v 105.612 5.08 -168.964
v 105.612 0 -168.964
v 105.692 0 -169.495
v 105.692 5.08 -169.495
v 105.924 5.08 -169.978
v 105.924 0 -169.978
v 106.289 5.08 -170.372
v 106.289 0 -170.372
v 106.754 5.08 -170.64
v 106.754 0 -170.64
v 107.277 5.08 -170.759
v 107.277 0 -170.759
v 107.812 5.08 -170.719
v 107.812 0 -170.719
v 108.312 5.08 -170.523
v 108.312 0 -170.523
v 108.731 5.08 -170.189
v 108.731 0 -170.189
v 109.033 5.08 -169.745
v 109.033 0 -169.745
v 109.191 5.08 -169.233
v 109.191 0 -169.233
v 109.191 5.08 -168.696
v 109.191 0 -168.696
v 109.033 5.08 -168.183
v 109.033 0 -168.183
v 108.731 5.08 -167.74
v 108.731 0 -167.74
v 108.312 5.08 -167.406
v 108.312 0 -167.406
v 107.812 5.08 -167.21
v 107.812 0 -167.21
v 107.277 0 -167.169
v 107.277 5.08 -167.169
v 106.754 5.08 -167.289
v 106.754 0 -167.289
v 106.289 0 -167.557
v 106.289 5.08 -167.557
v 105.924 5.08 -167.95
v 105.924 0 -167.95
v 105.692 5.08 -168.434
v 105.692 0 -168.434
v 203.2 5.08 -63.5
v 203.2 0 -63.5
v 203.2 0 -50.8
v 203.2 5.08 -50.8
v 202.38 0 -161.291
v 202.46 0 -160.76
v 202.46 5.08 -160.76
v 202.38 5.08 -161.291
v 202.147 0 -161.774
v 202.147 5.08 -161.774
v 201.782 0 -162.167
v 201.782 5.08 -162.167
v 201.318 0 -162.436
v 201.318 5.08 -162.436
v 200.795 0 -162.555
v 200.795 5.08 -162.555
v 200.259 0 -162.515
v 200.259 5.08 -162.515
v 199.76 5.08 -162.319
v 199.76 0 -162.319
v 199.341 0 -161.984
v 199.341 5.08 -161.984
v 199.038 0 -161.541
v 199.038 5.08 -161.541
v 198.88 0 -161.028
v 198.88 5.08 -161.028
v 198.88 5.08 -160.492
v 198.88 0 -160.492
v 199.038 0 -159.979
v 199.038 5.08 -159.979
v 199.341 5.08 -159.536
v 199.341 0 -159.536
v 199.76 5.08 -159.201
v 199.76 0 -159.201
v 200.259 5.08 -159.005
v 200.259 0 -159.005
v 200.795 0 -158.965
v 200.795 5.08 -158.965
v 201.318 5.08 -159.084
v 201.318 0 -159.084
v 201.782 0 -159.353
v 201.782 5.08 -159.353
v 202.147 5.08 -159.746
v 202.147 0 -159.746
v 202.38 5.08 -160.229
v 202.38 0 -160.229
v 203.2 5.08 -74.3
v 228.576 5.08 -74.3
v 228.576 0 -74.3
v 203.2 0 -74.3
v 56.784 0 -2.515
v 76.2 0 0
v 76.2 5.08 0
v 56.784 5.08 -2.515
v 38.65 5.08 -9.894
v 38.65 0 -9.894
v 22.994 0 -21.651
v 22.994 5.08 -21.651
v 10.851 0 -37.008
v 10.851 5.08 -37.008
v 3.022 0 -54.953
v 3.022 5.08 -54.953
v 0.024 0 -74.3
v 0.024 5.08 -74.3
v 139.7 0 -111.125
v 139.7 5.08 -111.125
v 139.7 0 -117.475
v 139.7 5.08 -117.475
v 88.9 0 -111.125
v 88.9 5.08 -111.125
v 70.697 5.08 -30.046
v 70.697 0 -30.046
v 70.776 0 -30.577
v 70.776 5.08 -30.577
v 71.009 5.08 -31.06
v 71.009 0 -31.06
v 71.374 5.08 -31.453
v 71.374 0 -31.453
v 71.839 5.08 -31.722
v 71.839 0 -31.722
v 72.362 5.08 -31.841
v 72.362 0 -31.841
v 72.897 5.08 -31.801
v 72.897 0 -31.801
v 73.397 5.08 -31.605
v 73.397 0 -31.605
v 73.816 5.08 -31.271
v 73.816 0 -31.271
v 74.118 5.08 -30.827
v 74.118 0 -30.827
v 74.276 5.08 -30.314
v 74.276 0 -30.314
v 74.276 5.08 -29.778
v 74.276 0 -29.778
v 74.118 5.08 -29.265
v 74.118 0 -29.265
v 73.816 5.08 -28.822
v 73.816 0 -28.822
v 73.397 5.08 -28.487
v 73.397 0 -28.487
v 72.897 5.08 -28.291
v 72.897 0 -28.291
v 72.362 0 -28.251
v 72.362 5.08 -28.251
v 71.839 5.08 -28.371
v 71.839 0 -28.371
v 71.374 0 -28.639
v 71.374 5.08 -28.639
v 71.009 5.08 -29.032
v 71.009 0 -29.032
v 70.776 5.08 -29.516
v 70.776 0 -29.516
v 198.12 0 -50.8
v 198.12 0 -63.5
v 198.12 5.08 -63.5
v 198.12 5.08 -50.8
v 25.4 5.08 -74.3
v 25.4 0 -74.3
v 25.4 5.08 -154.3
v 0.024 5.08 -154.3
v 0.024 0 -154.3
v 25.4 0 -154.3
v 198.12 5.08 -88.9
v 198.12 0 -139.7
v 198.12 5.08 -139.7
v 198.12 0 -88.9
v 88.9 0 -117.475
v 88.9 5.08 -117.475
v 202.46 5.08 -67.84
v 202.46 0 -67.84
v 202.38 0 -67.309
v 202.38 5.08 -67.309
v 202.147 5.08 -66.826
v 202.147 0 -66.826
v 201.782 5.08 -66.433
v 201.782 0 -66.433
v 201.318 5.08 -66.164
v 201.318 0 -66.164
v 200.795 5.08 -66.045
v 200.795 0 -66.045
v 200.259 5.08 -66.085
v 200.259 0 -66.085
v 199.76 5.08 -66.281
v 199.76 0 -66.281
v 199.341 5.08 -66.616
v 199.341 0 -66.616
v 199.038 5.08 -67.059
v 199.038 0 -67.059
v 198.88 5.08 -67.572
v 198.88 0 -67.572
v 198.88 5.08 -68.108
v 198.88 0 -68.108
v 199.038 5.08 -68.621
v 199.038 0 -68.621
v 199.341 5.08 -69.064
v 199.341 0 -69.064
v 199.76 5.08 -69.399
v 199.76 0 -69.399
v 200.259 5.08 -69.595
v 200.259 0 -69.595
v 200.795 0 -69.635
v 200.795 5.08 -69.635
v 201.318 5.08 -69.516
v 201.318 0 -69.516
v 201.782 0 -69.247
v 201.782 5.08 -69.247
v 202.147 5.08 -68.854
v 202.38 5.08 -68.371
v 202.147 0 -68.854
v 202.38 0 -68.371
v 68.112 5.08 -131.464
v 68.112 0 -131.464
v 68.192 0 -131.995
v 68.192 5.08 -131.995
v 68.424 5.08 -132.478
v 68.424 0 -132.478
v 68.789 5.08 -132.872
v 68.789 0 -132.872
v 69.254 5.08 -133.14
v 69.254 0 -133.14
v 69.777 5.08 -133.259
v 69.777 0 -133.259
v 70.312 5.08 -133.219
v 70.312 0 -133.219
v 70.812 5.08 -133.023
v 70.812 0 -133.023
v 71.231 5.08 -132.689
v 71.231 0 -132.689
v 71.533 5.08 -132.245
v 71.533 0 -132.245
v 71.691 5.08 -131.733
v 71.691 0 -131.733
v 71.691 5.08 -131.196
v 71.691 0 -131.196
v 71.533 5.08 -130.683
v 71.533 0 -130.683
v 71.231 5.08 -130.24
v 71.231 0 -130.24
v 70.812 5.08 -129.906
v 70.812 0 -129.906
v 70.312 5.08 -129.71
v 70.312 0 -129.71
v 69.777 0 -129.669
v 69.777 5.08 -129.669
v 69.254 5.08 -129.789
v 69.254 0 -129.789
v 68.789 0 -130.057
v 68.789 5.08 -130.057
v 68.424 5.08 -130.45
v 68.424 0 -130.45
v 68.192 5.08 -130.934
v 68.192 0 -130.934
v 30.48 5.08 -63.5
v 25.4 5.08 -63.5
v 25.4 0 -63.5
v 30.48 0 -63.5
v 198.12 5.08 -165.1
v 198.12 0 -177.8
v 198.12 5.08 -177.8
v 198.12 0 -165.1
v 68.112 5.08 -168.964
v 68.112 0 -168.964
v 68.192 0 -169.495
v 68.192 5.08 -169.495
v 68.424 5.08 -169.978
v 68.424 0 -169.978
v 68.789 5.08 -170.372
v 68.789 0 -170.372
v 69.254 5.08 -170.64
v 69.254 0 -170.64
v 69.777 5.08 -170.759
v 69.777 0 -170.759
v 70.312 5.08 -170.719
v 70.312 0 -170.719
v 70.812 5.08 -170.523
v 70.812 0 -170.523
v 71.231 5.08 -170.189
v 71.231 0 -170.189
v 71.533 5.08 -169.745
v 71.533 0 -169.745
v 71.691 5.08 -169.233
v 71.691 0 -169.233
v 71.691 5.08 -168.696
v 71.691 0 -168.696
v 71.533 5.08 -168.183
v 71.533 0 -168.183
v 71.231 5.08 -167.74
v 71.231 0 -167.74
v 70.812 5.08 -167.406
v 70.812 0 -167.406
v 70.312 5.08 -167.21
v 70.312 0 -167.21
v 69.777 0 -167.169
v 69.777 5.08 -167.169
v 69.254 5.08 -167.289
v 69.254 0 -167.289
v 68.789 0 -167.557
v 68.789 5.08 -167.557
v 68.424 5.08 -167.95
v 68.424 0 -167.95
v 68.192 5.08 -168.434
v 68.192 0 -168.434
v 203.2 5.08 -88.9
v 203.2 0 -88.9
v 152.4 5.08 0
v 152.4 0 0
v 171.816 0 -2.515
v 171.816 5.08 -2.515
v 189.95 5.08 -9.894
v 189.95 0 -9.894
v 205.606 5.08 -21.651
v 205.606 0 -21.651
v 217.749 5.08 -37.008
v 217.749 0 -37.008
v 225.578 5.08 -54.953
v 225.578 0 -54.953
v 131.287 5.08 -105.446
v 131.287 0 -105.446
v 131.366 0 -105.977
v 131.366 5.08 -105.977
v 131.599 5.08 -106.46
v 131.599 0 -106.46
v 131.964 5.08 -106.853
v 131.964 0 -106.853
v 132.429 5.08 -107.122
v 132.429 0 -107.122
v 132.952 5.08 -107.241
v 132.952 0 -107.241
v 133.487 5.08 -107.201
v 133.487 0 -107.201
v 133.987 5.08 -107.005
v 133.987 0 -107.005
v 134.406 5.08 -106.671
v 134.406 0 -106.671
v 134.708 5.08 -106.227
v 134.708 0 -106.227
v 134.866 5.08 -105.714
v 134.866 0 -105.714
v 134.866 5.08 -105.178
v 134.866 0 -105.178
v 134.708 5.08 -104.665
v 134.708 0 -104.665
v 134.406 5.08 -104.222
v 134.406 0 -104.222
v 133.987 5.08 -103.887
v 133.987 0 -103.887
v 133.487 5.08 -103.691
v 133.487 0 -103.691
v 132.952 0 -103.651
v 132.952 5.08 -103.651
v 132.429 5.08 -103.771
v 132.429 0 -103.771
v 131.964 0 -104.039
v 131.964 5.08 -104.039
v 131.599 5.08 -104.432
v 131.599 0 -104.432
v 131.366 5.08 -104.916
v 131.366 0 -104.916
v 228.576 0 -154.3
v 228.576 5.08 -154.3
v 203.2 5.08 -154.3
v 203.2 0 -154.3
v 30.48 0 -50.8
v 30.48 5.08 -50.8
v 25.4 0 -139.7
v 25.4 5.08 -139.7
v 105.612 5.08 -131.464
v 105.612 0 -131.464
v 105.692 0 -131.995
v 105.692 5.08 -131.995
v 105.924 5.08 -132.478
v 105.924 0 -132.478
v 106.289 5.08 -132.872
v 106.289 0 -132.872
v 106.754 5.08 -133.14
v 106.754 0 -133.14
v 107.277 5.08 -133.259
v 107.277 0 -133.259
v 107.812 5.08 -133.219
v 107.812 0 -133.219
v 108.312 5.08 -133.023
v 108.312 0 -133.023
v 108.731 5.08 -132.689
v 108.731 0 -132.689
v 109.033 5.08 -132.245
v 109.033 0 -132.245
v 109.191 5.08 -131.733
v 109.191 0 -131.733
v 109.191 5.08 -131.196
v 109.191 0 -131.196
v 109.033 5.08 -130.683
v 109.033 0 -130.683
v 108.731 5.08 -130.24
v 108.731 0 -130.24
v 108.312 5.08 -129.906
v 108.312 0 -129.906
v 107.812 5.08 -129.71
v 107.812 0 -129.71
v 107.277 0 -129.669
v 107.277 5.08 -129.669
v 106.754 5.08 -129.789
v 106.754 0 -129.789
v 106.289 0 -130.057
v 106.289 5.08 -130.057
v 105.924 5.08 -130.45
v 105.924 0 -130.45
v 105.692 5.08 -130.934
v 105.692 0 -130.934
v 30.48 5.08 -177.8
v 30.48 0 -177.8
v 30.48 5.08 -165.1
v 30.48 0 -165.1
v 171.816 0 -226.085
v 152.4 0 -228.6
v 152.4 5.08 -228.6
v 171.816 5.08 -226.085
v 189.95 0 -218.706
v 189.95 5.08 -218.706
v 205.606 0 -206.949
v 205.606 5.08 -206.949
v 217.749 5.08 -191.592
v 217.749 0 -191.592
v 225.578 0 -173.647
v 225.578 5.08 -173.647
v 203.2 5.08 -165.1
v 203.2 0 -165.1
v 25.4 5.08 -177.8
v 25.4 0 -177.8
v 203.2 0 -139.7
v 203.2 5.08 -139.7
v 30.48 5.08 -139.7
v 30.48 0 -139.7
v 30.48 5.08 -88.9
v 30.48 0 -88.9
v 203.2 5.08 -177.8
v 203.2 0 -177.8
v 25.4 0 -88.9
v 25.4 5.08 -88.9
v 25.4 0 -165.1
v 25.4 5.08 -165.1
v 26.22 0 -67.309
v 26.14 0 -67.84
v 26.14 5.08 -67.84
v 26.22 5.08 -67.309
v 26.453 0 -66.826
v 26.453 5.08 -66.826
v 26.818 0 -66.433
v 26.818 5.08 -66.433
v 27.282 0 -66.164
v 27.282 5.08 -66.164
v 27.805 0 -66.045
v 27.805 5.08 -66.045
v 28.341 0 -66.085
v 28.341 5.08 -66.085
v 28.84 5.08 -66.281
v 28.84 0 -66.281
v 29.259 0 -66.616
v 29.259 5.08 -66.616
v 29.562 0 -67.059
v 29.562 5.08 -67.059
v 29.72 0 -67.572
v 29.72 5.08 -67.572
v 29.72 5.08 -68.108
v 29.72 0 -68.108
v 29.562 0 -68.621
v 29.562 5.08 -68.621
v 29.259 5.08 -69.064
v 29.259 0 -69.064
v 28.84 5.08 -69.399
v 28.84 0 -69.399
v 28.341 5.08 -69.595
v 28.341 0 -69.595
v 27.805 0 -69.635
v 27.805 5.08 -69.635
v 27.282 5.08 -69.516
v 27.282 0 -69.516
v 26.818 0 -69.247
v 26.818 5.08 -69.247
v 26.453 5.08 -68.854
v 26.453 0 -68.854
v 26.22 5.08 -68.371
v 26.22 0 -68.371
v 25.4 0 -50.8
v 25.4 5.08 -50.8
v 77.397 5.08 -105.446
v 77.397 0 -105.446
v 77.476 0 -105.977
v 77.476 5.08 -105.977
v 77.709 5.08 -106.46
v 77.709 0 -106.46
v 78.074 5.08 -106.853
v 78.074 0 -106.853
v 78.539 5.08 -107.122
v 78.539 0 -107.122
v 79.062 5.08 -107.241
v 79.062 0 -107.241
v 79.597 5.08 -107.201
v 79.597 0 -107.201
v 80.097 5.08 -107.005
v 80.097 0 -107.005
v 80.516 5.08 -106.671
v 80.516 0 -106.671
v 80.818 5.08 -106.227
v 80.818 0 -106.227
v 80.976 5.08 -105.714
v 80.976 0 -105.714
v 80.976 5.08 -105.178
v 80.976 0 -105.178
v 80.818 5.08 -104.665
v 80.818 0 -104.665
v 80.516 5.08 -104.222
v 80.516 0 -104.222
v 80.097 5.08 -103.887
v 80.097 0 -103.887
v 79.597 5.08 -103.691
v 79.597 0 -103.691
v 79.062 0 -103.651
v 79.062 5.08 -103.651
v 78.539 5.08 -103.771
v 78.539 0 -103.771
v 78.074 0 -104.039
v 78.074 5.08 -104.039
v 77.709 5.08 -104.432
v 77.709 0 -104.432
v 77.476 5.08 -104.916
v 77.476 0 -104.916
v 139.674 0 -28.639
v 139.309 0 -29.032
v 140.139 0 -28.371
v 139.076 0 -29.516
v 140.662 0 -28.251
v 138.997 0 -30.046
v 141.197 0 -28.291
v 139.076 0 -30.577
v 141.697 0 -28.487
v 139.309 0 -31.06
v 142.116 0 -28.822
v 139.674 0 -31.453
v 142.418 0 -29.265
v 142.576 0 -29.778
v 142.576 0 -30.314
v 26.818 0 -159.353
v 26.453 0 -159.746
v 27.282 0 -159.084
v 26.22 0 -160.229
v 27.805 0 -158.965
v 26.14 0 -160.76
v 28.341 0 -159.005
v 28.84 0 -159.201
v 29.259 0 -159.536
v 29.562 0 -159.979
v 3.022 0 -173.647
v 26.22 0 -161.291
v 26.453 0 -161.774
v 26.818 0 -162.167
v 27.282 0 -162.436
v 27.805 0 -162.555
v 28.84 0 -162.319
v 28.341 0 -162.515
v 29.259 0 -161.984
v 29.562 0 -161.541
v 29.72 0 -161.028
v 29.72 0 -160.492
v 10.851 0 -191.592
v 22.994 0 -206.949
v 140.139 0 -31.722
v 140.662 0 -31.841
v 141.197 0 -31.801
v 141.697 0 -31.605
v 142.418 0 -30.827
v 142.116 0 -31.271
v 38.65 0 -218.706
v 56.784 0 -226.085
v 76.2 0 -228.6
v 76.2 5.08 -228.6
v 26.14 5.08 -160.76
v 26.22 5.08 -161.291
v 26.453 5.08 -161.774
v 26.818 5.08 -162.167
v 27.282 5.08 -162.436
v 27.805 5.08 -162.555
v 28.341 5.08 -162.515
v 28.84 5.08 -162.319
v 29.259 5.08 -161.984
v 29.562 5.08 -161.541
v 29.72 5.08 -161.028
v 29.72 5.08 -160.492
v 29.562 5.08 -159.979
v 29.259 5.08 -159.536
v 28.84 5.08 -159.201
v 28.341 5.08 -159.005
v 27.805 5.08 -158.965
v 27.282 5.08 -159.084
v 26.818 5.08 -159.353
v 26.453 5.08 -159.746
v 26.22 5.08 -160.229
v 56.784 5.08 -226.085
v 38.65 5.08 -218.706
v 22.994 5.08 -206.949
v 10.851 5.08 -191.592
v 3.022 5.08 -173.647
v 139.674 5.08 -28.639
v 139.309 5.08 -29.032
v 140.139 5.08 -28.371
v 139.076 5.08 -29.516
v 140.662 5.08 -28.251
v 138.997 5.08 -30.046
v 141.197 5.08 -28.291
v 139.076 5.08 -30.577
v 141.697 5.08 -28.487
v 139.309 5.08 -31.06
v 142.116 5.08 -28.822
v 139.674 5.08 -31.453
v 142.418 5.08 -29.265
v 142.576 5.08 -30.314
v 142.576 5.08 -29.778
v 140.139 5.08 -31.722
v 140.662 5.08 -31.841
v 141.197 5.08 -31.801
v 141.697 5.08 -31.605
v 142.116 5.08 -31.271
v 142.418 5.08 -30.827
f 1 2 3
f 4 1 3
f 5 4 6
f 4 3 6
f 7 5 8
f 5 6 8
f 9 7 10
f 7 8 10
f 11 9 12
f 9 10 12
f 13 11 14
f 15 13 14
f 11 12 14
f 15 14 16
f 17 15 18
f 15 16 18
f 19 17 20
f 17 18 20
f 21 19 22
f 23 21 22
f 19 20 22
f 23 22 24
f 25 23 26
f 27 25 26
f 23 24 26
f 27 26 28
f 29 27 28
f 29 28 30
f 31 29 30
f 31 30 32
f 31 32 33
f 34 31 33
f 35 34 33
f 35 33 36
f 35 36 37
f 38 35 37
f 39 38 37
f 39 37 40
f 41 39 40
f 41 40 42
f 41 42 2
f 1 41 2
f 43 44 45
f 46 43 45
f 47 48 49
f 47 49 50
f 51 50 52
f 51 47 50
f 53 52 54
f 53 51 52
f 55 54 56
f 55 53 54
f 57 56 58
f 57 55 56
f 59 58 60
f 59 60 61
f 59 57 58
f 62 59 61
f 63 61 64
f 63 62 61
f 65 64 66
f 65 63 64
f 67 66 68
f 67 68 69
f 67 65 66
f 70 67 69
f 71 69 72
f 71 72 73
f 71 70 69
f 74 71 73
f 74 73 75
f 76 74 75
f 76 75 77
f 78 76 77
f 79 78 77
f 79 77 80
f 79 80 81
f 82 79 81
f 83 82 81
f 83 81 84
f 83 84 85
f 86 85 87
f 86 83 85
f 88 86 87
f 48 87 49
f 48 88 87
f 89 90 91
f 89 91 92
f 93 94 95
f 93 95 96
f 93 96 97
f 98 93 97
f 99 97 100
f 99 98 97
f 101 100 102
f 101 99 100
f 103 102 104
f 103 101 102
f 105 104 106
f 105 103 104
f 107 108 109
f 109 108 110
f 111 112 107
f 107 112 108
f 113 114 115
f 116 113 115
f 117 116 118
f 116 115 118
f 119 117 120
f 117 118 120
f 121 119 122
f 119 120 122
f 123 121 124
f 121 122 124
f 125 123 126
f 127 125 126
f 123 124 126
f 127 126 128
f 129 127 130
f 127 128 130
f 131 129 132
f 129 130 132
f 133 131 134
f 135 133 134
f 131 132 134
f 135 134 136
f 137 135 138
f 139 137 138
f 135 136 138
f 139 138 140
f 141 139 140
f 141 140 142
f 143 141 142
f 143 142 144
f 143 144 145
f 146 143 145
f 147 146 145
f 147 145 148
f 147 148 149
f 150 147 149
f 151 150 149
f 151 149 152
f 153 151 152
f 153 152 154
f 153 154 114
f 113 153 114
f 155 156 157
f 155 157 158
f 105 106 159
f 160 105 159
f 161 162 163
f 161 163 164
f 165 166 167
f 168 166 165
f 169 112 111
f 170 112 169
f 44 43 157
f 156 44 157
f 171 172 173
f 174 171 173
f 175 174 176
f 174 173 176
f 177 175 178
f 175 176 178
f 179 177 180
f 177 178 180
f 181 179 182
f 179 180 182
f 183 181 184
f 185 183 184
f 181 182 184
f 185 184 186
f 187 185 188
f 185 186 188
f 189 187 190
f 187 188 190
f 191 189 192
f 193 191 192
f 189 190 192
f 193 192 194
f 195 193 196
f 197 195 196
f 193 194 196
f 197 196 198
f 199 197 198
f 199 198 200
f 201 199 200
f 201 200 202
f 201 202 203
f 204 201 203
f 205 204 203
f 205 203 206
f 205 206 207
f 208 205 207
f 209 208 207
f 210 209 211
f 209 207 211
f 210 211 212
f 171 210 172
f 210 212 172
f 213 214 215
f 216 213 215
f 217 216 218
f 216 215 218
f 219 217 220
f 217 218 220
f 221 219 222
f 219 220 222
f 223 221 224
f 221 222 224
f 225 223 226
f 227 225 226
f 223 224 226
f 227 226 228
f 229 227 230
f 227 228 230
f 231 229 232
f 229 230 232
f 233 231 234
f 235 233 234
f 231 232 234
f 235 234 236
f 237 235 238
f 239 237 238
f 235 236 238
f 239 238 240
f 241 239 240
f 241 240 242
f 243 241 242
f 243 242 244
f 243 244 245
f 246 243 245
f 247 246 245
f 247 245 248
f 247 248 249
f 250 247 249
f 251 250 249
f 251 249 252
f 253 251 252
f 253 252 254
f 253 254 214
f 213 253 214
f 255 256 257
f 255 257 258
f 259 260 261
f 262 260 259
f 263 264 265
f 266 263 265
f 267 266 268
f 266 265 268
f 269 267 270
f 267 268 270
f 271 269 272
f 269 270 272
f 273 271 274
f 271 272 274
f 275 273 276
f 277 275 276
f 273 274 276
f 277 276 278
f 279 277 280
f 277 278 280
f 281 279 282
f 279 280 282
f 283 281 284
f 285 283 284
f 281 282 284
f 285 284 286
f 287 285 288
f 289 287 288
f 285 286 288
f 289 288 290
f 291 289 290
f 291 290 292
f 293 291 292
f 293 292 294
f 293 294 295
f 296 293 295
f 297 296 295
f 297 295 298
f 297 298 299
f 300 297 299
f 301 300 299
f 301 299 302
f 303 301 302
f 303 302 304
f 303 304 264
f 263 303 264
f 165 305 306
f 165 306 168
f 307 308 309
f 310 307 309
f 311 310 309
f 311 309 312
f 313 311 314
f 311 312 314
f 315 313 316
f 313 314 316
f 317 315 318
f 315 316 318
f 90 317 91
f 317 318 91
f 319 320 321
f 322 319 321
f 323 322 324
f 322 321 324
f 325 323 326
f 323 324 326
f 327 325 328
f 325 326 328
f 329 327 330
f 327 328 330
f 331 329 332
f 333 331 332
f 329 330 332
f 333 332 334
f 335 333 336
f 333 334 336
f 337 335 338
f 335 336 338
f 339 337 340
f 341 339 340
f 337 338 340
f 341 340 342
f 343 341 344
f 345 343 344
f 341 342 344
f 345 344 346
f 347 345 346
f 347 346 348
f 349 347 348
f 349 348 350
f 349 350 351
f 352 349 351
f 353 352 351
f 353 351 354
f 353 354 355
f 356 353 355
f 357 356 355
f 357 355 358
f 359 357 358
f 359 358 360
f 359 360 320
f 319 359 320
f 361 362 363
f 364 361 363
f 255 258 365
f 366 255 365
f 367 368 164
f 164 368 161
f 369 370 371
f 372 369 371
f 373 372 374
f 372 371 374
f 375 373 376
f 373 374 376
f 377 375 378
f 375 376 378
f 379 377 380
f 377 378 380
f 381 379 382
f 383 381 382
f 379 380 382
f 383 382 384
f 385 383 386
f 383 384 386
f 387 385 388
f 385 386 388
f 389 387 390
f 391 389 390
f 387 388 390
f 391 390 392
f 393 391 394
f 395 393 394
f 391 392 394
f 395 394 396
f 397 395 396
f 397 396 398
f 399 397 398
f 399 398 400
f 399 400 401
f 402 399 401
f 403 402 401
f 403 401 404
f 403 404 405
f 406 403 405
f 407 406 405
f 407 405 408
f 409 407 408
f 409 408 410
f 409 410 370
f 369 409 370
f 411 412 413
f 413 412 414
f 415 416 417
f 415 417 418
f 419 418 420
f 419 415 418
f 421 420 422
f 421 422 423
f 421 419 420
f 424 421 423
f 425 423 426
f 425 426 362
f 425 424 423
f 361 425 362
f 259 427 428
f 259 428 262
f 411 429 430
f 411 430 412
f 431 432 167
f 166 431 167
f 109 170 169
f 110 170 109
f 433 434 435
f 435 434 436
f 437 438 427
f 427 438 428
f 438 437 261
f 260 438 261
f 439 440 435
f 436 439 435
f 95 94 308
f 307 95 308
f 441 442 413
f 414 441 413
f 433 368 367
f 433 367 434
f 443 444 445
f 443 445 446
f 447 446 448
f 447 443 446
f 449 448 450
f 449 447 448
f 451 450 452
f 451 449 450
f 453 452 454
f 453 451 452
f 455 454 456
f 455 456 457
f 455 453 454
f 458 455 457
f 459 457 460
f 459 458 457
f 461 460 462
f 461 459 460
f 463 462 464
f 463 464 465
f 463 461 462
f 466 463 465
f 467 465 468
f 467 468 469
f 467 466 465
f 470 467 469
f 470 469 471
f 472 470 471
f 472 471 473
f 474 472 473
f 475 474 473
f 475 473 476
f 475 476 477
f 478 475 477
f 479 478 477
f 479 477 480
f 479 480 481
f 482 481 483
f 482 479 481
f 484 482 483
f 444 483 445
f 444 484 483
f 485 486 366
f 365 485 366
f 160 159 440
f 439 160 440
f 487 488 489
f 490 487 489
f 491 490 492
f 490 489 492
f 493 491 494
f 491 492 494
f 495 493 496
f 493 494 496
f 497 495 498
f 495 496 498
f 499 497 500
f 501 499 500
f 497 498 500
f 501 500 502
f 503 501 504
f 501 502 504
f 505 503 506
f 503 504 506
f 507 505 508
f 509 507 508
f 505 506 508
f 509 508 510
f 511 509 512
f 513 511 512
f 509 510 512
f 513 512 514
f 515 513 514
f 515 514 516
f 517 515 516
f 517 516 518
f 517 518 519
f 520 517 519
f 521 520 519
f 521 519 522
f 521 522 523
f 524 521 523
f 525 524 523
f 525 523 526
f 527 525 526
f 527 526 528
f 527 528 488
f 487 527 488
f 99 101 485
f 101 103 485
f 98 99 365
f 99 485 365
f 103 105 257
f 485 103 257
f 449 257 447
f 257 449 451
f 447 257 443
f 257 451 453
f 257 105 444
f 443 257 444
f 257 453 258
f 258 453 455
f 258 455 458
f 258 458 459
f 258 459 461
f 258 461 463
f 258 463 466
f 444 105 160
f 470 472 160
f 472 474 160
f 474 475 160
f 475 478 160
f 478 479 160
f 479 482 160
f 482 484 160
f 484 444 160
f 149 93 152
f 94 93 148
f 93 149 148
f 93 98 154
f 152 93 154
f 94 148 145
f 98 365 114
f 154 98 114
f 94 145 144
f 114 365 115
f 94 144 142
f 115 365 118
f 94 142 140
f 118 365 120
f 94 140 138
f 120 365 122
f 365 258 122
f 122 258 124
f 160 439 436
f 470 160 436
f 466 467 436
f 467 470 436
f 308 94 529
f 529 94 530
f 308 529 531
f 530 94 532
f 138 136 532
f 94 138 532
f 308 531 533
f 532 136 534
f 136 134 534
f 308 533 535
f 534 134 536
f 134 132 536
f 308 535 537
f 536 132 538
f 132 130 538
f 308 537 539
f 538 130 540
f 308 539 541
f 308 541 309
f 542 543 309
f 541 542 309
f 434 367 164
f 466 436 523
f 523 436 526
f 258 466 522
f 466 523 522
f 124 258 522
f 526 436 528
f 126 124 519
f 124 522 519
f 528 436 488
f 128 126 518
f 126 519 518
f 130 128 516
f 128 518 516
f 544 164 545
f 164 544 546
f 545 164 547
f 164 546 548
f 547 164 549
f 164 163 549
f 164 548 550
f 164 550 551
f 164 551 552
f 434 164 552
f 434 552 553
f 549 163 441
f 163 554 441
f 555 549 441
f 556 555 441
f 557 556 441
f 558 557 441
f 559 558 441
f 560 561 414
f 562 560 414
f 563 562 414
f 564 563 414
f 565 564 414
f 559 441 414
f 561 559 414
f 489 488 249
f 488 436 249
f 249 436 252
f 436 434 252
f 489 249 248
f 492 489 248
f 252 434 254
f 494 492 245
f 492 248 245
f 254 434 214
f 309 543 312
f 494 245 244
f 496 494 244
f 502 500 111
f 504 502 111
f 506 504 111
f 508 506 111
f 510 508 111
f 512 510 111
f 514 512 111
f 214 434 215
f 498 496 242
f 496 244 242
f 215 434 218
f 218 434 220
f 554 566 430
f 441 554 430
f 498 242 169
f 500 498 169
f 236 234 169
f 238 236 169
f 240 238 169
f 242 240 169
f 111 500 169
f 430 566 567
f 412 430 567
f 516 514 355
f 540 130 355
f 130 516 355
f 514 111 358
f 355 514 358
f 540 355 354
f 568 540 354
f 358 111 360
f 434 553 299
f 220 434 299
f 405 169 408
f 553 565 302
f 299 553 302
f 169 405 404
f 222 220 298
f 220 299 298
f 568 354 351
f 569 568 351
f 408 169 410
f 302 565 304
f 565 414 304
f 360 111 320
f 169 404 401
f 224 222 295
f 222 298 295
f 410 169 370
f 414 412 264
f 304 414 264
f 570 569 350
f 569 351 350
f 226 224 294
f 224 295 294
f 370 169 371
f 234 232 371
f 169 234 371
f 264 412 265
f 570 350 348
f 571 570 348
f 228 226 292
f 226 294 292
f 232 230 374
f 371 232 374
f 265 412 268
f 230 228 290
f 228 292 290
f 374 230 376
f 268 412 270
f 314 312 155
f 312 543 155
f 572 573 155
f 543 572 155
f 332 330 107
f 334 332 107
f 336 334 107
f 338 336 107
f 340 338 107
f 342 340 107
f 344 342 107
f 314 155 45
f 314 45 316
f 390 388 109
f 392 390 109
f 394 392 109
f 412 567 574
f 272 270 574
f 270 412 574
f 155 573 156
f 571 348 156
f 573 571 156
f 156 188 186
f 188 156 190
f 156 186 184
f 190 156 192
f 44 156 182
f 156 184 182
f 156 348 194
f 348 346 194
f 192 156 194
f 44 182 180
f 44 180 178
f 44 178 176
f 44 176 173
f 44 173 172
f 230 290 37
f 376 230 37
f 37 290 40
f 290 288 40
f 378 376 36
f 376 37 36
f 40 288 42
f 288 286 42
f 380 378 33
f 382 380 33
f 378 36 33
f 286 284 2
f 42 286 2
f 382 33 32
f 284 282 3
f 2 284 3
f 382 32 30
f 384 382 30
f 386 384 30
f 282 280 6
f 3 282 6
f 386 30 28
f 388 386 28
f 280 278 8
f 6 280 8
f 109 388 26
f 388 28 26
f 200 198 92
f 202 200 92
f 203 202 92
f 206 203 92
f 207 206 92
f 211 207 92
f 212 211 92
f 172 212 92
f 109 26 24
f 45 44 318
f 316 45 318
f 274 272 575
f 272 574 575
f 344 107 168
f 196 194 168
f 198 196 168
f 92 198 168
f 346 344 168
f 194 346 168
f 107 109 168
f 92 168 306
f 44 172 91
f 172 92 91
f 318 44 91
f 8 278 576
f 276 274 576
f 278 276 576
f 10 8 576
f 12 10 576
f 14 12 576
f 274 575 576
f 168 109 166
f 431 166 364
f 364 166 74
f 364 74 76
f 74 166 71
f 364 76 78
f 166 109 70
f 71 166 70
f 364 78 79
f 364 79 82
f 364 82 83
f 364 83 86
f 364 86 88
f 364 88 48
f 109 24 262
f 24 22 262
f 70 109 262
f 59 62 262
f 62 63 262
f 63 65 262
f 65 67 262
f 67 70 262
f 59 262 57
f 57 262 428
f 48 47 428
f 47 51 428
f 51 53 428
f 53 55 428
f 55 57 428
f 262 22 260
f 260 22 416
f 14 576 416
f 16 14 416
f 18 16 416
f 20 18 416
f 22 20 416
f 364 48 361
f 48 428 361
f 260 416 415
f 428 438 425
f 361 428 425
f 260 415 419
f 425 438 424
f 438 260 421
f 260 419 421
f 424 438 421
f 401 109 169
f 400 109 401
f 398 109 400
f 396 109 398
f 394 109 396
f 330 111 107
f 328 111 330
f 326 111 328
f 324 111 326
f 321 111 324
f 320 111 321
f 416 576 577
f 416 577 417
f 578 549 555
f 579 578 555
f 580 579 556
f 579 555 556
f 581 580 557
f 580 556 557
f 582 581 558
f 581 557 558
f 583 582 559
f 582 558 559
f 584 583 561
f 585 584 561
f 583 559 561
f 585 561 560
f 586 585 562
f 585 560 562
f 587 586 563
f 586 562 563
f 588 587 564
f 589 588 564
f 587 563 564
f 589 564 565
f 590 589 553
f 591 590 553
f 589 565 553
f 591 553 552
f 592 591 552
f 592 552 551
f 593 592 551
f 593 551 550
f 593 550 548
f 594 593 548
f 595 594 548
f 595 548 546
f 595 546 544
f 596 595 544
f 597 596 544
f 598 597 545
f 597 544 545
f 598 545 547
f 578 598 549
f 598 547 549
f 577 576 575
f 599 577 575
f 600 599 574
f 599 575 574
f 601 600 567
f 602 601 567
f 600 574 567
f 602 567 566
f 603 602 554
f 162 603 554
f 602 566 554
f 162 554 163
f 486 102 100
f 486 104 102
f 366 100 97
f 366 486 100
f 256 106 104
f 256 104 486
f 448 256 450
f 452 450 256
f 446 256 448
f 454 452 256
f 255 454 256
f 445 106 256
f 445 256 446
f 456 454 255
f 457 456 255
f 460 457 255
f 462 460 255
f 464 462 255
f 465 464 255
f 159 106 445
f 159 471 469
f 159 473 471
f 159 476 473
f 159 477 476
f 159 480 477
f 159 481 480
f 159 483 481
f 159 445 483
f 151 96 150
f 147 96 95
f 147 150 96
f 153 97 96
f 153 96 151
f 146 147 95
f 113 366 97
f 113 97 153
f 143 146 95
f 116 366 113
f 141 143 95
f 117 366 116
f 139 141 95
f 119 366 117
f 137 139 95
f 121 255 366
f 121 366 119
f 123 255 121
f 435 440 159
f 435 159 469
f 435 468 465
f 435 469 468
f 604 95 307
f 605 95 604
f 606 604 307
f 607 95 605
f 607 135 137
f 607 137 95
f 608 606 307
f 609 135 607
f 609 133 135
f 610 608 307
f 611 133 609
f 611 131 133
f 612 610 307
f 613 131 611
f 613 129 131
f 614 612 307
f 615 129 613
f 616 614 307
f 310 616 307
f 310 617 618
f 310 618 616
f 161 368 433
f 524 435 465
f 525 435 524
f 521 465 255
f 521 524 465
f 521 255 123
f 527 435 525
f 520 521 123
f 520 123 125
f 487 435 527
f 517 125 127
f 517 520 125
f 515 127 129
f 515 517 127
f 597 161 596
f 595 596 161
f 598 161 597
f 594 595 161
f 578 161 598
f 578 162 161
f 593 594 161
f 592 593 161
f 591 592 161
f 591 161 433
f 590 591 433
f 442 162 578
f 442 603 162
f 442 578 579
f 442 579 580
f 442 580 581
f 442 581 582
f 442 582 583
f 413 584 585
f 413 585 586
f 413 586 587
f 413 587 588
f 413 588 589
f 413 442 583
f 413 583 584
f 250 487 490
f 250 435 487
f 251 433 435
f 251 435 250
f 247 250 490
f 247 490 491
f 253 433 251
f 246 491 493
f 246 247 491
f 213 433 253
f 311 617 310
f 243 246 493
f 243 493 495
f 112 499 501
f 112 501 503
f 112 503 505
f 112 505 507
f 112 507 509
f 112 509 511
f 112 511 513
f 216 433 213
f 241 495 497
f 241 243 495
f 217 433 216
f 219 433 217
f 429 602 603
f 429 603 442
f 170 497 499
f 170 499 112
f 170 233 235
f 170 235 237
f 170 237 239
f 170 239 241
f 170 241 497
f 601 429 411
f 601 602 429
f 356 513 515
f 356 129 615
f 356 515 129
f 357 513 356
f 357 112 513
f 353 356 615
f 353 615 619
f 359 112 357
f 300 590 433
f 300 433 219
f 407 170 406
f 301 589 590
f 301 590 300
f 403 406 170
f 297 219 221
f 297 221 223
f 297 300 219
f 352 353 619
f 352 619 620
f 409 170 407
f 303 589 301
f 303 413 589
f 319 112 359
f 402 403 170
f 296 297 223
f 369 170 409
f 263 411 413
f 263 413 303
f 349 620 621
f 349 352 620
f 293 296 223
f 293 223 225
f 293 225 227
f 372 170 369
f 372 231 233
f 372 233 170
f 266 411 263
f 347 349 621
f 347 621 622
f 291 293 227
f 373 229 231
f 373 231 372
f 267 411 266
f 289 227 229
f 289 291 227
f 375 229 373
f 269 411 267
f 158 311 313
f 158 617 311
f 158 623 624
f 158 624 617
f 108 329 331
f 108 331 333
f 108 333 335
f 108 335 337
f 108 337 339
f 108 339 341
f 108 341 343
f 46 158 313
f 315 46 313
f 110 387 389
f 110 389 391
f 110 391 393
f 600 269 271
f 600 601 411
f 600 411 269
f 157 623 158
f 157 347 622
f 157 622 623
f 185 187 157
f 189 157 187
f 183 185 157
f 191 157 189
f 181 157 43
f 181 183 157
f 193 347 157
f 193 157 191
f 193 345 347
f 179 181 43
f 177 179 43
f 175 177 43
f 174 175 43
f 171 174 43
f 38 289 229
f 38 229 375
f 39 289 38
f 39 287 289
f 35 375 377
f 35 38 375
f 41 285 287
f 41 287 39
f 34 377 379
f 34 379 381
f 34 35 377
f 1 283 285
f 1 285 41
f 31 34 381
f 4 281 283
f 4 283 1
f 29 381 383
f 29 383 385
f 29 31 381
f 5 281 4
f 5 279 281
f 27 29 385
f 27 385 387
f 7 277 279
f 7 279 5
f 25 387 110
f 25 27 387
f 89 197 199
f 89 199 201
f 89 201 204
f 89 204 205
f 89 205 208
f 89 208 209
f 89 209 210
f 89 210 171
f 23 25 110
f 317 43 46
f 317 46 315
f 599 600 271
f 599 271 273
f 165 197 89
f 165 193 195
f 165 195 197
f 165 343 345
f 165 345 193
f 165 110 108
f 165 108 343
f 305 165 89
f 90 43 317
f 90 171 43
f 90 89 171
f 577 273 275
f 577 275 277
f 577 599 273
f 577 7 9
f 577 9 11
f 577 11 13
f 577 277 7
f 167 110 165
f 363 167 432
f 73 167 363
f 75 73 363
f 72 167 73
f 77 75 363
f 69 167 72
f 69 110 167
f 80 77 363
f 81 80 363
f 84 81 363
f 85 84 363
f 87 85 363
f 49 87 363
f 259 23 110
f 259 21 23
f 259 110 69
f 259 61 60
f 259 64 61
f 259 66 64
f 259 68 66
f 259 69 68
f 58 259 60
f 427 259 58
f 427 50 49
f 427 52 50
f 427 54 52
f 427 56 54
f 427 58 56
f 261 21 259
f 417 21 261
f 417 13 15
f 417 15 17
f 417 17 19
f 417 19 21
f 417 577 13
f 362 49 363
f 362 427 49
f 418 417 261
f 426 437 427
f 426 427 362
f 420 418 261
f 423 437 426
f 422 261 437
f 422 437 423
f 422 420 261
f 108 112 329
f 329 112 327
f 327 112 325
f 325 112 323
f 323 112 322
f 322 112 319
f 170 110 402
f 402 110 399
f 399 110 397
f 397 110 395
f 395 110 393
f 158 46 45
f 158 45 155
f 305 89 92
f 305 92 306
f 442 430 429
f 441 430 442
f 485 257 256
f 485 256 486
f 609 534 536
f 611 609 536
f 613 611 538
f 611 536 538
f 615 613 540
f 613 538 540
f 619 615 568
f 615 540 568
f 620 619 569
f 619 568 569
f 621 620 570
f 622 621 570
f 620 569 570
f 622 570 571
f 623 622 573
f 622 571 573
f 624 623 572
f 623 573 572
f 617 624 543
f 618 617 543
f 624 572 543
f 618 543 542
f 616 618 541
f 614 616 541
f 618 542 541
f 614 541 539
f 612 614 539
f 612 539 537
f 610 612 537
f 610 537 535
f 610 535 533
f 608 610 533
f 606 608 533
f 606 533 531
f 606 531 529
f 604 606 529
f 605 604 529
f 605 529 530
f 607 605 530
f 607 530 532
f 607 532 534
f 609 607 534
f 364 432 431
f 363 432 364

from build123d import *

# Parameters (mm, degrees)
SKETCH1_W                = 228.6
SKETCH1_H                = 228.6
BOSS_EXTRUDE1_DEPTH      = 5.08
SKETCH2_W                = 25.4
SKETCH2_H                = 80
CUT_EXTRUDE1_DEPTH       = 5.08
SKETCH3_W                = 5.08
SKETCH3_H                = 12.7
SKETCH3_H_2              = 50.8
CUT_EXTRUDE2_DEPTH       = 5.08
CUT_EXTRUDE4_DEPTH       = 5.08
MIRROR4_COPY_1_DEPTH     = 5.08
CUT_EXTRUDE6_REACH       = 7.08
SKETCH7_W                = 50.8
SKETCH7_H                = 6.35
M3_CLEARANCE_HOLE1_D     = 3.6
M3_CLEARANCE_HOLE1_DEPTH = 5.08
M3_CLEARANCE_HOLE2_D     = 3.6
M3_CLEARANCE_HOLE2_DEPTH = 5.08
SKETCH19_R               = 1.799999956
CUT_EXTRUDE7_DEPTH       = 5.08
MIRROR6_COPY_1_SKETCH_R  = 1.799999956
MIRROR6_COPY_1_DEPTH     = 5.08


with BuildPart() as part:
    # Sketch1 → Boss-Extrude1 (new body)
    with BuildSketch(Plane(origin=(0, 0, 0), x_dir=(1, 0, 0), z_dir=(0, 1, 0))):
        with Locations((114.3, 114.3)):
            Rectangle(SKETCH1_W, SKETCH1_H)
    extrude(amount=BOSS_EXTRUDE1_DEPTH)

    # Sketch2 → Cut-Extrude1 (cut)
    with BuildSketch(Plane(origin=(0, 5.08, 0), x_dir=(1, 0, 0), z_dir=(0, 1, 0))):
        with Locations((12.7, 114.3)):
            Rectangle(SKETCH2_W, SKETCH2_H)
    cut_extrude1 = extrude(amount=-CUT_EXTRUDE1_DEPTH, mode=Mode.SUBTRACT)

    # Mirror1: Cut-Extrude1 across plane
    add(cut_extrude1.mirror(Plane.ZY.offset(-114.3)), mode=Mode.SUBTRACT)

    # Sketch3 → Cut-Extrude2 (cut)
    with BuildSketch(Plane.XZ):
        with Locations((27.94, -171.45)):
            Rectangle(SKETCH3_W, SKETCH3_H)
        with Locations((27.94, -114.3)):
            Rectangle(SKETCH3_W, SKETCH3_H_2)
        with Locations((27.94, -57.15)):
            Rectangle(SKETCH3_W, SKETCH3_H)
    cut_extrude2 = extrude(amount=-CUT_EXTRUDE2_DEPTH, mode=Mode.SUBTRACT)

    # Mirror2: Cut-Extrude2 across plane
    add(cut_extrude2.mirror(Plane.ZY.offset(-114.3)), mode=Mode.SUBTRACT)

    # Sketch5 → Cut-Extrude4 (cut)
    with BuildSketch(Plane.XZ):
        with BuildLine():
            Line((0, -76.2), (0, 0))
            Line((0, 0), (76.2, 0))
            ThreePointArc((76.2, 0), (22.318463274, -22.318463274), (0, -76.2))
        make_face()
    cut_extrude4 = extrude(amount=-CUT_EXTRUDE4_DEPTH, mode=Mode.SUBTRACT)

    # Mirror3: Cut-Extrude4 across plane
    add(cut_extrude4.mirror(Plane.ZY.offset(-114.3)), mode=Mode.SUBTRACT)

    # Mirror4: Cut-Extrude4 across plane
    add(cut_extrude4.mirror(Plane.XY.offset(-114.3)), mode=Mode.SUBTRACT)

    # Mirror4 copy 1 sketch → Mirror4 copy 1 (cut)
    with BuildSketch(Plane(origin=(228.6, 0, -228.6), x_dir=(-1, 0, 0), z_dir=(0, -1, 0))):
        with BuildLine():
            Line((0, -76.2), (0, 0))
            Line((0, 0), (76.2, 0))
            ThreePointArc((76.2, 0), (22.318463274, -22.318463274), (0, -76.2))
        make_face()
    extrude(amount=-MIRROR4_COPY_1_DEPTH, mode=Mode.SUBTRACT)

    # Sketch7 → Cut-Extrude6 (cut, up to next)
    with BuildSketch(Plane(origin=(0, 5.08, 0), x_dir=(1, 0, 0), z_dir=(0, 1, 0)), mode=Mode.PRIVATE) as cut_extrude6_sk1:
        with Locations((114.3, 114.3)):
            Rectangle(SKETCH7_W, SKETCH7_H)
    cut_extrude6_tool1 = extrude(cut_extrude6_sk1.sketch, amount=-CUT_EXTRUDE6_REACH, mode=Mode.PRIVATE) & part.part
    add(cut_extrude6_tool1.solids().sort_by_distance((114.3, 5.08, -114.3))[0], mode=Mode.SUBTRACT)

    # M3 Clearance Hole1
    with Locations(Plane(origin=(0, 5.08, 0), x_dir=(1, 0, 0), z_dir=(0, 1, 0))):
        with Locations((107.41154214, 131.464372429), (107.41154214, 168.964372429), (69.91154214, 131.464372429), (69.91154214, 168.964372429)):
            Hole(M3_CLEARANCE_HOLE1_D / 2, depth=M3_CLEARANCE_HOLE1_DEPTH)

    # M3 Clearance Hole2
    with Locations(Plane(origin=(0, 5.08, 0), x_dir=(1, 0, 0), z_dir=(0, 1, 0))):
        with Locations((72.49651655, 30.046201608), (140.79651655, 30.046201608), (79.19651655, 105.446201608), (133.08651655, 105.446201608)):
            Hole(M3_CLEARANCE_HOLE2_D / 2, depth=M3_CLEARANCE_HOLE2_DEPTH)

    # Sketch19 → Cut-Extrude7 (cut)
    with BuildSketch(Plane.XZ):
        with Locations((200.66, -67.839999956)):
            Circle(SKETCH19_R)
    cut_extrude7 = extrude(amount=-CUT_EXTRUDE7_DEPTH, mode=Mode.SUBTRACT)

    # Mirror5: Cut-Extrude7 across plane
    add(cut_extrude7.mirror(Plane.XY.offset(-114.3)), mode=Mode.SUBTRACT)

    # Mirror6: Cut-Extrude7 across plane
    add(cut_extrude7.mirror(Plane.ZY.offset(-114.3)), mode=Mode.SUBTRACT)

    # Mirror6 copy 1 sketch → Mirror6 copy 1 (cut)
    with BuildSketch(Plane(origin=(228.6, 0, -228.6), x_dir=(-1, 0, 0), z_dir=(0, -1, 0))):
        with Locations((200.66, -67.839999956)):
            Circle(MIRROR6_COPY_1_SKETCH_R)
    extrude(amount=-MIRROR6_COPY_1_DEPTH, mode=Mode.SUBTRACT)


solid = part.part
